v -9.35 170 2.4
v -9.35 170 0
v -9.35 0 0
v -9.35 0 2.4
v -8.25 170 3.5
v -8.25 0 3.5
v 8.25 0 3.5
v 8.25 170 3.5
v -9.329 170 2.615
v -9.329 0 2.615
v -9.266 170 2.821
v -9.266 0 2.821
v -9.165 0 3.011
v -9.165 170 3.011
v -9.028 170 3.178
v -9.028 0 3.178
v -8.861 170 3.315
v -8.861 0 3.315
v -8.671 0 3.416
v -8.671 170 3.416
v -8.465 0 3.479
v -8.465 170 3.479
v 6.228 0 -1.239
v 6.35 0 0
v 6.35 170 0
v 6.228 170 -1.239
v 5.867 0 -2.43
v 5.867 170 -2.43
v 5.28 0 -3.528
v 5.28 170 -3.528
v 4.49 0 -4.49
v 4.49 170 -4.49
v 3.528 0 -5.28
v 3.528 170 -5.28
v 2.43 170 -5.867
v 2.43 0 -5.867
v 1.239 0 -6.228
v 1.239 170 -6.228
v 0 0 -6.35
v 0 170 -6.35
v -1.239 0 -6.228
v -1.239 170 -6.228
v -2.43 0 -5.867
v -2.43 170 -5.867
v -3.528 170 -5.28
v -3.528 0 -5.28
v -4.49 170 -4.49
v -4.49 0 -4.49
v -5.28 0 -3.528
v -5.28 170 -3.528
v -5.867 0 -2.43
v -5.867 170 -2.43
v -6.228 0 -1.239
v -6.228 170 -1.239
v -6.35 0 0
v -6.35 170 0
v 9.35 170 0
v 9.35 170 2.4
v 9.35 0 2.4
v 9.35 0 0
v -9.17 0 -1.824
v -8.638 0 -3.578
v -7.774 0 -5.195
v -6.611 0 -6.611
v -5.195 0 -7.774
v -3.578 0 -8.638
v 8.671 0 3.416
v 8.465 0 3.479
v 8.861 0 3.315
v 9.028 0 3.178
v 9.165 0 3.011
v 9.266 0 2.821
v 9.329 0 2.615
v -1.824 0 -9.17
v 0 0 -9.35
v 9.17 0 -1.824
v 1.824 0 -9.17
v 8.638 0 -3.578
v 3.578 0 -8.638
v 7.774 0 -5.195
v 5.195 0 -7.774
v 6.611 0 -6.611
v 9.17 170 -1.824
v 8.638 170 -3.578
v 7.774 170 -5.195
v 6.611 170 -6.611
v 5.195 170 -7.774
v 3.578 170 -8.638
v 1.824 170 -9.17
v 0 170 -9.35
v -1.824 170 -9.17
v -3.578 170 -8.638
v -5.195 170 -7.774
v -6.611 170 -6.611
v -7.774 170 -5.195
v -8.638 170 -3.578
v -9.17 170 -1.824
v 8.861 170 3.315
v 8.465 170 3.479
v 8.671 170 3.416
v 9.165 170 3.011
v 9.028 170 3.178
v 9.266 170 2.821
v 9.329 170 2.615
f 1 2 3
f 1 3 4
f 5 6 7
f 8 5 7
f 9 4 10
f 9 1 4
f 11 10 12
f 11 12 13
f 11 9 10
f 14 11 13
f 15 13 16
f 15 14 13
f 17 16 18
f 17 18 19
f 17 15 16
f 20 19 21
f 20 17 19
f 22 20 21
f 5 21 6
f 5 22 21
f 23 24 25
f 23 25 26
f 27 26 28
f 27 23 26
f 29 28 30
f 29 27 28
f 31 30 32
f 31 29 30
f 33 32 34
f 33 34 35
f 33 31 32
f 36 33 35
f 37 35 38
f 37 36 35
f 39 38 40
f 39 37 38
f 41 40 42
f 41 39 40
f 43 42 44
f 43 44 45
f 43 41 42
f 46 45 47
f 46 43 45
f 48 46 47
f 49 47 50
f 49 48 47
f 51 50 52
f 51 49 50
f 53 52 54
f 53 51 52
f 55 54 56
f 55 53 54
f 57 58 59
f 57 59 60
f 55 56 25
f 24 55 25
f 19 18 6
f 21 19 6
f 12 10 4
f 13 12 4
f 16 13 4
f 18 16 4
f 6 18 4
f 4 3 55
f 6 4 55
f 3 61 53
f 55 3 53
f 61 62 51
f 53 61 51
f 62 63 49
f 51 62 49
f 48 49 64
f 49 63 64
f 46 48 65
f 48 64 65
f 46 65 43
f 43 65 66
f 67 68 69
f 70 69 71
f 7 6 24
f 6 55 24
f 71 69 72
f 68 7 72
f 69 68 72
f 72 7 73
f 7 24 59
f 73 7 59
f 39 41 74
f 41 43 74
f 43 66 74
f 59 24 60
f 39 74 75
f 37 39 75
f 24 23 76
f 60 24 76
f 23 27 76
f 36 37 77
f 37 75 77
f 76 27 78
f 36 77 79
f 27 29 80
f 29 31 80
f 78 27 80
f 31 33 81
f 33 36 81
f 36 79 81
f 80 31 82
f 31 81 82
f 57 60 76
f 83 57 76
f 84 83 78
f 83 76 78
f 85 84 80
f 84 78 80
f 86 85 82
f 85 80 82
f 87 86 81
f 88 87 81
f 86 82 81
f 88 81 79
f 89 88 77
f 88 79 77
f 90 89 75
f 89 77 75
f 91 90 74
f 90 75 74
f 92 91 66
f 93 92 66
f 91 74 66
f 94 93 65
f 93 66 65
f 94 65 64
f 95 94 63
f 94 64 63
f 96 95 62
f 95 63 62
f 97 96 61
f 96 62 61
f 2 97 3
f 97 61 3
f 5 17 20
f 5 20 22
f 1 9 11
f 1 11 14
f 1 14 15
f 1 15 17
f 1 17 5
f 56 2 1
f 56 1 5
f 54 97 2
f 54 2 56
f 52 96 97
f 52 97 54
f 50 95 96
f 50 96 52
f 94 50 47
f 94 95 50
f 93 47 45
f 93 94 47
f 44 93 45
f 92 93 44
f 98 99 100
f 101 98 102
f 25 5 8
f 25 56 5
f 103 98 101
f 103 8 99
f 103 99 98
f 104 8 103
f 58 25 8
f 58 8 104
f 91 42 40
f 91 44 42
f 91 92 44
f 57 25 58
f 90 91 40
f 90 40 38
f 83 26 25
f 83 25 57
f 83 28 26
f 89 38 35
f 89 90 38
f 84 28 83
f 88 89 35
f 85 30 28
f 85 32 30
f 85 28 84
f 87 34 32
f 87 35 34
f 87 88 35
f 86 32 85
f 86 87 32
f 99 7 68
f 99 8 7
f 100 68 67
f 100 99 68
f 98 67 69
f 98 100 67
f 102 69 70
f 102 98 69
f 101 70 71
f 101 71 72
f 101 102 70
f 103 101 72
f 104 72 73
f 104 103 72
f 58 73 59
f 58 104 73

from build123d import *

# Parameters (mm, degrees)
SEMICIRCULAR_TUBE_DEPTH = 170
FILLET_EDGES_R          = 1.1


with BuildPart() as part:
    # Sketch1 → semicircular tube (new body)
    with BuildSketch(Plane(origin=(0, 0, 0), x_dir=(1, 0, 0), z_dir=(0, 1, 0))):
        with BuildLine():
            Line((-9.35, 0), (-9.35, -3.5))
            Line((-9.35, -3.5), (9.35, -3.5))
            Line((9.35, -3.5), (9.35, 0))
            ThreePointArc((9.35, 0), (0, 9.35), (-9.35, 0))
        make_face()
        with BuildLine():
            Line((-6.35, 0), (6.35, 0))
            ThreePointArc((6.35, 0), (0, 6.35), (-6.35, 0))
        make_face(mode=Mode.SUBTRACT)
    extrude(amount=SEMICIRCULAR_TUBE_DEPTH)

    # fillet edges
    fillet_edges_edges = [part.edges().sort_by_distance(p)[0] for p in [
        (9.35, 85, 3.5),
        (-9.35, 85, 3.5),
    ]]
    fillet(fillet_edges_edges, radius=FILLET_EDGES_R)


solid = part.part
